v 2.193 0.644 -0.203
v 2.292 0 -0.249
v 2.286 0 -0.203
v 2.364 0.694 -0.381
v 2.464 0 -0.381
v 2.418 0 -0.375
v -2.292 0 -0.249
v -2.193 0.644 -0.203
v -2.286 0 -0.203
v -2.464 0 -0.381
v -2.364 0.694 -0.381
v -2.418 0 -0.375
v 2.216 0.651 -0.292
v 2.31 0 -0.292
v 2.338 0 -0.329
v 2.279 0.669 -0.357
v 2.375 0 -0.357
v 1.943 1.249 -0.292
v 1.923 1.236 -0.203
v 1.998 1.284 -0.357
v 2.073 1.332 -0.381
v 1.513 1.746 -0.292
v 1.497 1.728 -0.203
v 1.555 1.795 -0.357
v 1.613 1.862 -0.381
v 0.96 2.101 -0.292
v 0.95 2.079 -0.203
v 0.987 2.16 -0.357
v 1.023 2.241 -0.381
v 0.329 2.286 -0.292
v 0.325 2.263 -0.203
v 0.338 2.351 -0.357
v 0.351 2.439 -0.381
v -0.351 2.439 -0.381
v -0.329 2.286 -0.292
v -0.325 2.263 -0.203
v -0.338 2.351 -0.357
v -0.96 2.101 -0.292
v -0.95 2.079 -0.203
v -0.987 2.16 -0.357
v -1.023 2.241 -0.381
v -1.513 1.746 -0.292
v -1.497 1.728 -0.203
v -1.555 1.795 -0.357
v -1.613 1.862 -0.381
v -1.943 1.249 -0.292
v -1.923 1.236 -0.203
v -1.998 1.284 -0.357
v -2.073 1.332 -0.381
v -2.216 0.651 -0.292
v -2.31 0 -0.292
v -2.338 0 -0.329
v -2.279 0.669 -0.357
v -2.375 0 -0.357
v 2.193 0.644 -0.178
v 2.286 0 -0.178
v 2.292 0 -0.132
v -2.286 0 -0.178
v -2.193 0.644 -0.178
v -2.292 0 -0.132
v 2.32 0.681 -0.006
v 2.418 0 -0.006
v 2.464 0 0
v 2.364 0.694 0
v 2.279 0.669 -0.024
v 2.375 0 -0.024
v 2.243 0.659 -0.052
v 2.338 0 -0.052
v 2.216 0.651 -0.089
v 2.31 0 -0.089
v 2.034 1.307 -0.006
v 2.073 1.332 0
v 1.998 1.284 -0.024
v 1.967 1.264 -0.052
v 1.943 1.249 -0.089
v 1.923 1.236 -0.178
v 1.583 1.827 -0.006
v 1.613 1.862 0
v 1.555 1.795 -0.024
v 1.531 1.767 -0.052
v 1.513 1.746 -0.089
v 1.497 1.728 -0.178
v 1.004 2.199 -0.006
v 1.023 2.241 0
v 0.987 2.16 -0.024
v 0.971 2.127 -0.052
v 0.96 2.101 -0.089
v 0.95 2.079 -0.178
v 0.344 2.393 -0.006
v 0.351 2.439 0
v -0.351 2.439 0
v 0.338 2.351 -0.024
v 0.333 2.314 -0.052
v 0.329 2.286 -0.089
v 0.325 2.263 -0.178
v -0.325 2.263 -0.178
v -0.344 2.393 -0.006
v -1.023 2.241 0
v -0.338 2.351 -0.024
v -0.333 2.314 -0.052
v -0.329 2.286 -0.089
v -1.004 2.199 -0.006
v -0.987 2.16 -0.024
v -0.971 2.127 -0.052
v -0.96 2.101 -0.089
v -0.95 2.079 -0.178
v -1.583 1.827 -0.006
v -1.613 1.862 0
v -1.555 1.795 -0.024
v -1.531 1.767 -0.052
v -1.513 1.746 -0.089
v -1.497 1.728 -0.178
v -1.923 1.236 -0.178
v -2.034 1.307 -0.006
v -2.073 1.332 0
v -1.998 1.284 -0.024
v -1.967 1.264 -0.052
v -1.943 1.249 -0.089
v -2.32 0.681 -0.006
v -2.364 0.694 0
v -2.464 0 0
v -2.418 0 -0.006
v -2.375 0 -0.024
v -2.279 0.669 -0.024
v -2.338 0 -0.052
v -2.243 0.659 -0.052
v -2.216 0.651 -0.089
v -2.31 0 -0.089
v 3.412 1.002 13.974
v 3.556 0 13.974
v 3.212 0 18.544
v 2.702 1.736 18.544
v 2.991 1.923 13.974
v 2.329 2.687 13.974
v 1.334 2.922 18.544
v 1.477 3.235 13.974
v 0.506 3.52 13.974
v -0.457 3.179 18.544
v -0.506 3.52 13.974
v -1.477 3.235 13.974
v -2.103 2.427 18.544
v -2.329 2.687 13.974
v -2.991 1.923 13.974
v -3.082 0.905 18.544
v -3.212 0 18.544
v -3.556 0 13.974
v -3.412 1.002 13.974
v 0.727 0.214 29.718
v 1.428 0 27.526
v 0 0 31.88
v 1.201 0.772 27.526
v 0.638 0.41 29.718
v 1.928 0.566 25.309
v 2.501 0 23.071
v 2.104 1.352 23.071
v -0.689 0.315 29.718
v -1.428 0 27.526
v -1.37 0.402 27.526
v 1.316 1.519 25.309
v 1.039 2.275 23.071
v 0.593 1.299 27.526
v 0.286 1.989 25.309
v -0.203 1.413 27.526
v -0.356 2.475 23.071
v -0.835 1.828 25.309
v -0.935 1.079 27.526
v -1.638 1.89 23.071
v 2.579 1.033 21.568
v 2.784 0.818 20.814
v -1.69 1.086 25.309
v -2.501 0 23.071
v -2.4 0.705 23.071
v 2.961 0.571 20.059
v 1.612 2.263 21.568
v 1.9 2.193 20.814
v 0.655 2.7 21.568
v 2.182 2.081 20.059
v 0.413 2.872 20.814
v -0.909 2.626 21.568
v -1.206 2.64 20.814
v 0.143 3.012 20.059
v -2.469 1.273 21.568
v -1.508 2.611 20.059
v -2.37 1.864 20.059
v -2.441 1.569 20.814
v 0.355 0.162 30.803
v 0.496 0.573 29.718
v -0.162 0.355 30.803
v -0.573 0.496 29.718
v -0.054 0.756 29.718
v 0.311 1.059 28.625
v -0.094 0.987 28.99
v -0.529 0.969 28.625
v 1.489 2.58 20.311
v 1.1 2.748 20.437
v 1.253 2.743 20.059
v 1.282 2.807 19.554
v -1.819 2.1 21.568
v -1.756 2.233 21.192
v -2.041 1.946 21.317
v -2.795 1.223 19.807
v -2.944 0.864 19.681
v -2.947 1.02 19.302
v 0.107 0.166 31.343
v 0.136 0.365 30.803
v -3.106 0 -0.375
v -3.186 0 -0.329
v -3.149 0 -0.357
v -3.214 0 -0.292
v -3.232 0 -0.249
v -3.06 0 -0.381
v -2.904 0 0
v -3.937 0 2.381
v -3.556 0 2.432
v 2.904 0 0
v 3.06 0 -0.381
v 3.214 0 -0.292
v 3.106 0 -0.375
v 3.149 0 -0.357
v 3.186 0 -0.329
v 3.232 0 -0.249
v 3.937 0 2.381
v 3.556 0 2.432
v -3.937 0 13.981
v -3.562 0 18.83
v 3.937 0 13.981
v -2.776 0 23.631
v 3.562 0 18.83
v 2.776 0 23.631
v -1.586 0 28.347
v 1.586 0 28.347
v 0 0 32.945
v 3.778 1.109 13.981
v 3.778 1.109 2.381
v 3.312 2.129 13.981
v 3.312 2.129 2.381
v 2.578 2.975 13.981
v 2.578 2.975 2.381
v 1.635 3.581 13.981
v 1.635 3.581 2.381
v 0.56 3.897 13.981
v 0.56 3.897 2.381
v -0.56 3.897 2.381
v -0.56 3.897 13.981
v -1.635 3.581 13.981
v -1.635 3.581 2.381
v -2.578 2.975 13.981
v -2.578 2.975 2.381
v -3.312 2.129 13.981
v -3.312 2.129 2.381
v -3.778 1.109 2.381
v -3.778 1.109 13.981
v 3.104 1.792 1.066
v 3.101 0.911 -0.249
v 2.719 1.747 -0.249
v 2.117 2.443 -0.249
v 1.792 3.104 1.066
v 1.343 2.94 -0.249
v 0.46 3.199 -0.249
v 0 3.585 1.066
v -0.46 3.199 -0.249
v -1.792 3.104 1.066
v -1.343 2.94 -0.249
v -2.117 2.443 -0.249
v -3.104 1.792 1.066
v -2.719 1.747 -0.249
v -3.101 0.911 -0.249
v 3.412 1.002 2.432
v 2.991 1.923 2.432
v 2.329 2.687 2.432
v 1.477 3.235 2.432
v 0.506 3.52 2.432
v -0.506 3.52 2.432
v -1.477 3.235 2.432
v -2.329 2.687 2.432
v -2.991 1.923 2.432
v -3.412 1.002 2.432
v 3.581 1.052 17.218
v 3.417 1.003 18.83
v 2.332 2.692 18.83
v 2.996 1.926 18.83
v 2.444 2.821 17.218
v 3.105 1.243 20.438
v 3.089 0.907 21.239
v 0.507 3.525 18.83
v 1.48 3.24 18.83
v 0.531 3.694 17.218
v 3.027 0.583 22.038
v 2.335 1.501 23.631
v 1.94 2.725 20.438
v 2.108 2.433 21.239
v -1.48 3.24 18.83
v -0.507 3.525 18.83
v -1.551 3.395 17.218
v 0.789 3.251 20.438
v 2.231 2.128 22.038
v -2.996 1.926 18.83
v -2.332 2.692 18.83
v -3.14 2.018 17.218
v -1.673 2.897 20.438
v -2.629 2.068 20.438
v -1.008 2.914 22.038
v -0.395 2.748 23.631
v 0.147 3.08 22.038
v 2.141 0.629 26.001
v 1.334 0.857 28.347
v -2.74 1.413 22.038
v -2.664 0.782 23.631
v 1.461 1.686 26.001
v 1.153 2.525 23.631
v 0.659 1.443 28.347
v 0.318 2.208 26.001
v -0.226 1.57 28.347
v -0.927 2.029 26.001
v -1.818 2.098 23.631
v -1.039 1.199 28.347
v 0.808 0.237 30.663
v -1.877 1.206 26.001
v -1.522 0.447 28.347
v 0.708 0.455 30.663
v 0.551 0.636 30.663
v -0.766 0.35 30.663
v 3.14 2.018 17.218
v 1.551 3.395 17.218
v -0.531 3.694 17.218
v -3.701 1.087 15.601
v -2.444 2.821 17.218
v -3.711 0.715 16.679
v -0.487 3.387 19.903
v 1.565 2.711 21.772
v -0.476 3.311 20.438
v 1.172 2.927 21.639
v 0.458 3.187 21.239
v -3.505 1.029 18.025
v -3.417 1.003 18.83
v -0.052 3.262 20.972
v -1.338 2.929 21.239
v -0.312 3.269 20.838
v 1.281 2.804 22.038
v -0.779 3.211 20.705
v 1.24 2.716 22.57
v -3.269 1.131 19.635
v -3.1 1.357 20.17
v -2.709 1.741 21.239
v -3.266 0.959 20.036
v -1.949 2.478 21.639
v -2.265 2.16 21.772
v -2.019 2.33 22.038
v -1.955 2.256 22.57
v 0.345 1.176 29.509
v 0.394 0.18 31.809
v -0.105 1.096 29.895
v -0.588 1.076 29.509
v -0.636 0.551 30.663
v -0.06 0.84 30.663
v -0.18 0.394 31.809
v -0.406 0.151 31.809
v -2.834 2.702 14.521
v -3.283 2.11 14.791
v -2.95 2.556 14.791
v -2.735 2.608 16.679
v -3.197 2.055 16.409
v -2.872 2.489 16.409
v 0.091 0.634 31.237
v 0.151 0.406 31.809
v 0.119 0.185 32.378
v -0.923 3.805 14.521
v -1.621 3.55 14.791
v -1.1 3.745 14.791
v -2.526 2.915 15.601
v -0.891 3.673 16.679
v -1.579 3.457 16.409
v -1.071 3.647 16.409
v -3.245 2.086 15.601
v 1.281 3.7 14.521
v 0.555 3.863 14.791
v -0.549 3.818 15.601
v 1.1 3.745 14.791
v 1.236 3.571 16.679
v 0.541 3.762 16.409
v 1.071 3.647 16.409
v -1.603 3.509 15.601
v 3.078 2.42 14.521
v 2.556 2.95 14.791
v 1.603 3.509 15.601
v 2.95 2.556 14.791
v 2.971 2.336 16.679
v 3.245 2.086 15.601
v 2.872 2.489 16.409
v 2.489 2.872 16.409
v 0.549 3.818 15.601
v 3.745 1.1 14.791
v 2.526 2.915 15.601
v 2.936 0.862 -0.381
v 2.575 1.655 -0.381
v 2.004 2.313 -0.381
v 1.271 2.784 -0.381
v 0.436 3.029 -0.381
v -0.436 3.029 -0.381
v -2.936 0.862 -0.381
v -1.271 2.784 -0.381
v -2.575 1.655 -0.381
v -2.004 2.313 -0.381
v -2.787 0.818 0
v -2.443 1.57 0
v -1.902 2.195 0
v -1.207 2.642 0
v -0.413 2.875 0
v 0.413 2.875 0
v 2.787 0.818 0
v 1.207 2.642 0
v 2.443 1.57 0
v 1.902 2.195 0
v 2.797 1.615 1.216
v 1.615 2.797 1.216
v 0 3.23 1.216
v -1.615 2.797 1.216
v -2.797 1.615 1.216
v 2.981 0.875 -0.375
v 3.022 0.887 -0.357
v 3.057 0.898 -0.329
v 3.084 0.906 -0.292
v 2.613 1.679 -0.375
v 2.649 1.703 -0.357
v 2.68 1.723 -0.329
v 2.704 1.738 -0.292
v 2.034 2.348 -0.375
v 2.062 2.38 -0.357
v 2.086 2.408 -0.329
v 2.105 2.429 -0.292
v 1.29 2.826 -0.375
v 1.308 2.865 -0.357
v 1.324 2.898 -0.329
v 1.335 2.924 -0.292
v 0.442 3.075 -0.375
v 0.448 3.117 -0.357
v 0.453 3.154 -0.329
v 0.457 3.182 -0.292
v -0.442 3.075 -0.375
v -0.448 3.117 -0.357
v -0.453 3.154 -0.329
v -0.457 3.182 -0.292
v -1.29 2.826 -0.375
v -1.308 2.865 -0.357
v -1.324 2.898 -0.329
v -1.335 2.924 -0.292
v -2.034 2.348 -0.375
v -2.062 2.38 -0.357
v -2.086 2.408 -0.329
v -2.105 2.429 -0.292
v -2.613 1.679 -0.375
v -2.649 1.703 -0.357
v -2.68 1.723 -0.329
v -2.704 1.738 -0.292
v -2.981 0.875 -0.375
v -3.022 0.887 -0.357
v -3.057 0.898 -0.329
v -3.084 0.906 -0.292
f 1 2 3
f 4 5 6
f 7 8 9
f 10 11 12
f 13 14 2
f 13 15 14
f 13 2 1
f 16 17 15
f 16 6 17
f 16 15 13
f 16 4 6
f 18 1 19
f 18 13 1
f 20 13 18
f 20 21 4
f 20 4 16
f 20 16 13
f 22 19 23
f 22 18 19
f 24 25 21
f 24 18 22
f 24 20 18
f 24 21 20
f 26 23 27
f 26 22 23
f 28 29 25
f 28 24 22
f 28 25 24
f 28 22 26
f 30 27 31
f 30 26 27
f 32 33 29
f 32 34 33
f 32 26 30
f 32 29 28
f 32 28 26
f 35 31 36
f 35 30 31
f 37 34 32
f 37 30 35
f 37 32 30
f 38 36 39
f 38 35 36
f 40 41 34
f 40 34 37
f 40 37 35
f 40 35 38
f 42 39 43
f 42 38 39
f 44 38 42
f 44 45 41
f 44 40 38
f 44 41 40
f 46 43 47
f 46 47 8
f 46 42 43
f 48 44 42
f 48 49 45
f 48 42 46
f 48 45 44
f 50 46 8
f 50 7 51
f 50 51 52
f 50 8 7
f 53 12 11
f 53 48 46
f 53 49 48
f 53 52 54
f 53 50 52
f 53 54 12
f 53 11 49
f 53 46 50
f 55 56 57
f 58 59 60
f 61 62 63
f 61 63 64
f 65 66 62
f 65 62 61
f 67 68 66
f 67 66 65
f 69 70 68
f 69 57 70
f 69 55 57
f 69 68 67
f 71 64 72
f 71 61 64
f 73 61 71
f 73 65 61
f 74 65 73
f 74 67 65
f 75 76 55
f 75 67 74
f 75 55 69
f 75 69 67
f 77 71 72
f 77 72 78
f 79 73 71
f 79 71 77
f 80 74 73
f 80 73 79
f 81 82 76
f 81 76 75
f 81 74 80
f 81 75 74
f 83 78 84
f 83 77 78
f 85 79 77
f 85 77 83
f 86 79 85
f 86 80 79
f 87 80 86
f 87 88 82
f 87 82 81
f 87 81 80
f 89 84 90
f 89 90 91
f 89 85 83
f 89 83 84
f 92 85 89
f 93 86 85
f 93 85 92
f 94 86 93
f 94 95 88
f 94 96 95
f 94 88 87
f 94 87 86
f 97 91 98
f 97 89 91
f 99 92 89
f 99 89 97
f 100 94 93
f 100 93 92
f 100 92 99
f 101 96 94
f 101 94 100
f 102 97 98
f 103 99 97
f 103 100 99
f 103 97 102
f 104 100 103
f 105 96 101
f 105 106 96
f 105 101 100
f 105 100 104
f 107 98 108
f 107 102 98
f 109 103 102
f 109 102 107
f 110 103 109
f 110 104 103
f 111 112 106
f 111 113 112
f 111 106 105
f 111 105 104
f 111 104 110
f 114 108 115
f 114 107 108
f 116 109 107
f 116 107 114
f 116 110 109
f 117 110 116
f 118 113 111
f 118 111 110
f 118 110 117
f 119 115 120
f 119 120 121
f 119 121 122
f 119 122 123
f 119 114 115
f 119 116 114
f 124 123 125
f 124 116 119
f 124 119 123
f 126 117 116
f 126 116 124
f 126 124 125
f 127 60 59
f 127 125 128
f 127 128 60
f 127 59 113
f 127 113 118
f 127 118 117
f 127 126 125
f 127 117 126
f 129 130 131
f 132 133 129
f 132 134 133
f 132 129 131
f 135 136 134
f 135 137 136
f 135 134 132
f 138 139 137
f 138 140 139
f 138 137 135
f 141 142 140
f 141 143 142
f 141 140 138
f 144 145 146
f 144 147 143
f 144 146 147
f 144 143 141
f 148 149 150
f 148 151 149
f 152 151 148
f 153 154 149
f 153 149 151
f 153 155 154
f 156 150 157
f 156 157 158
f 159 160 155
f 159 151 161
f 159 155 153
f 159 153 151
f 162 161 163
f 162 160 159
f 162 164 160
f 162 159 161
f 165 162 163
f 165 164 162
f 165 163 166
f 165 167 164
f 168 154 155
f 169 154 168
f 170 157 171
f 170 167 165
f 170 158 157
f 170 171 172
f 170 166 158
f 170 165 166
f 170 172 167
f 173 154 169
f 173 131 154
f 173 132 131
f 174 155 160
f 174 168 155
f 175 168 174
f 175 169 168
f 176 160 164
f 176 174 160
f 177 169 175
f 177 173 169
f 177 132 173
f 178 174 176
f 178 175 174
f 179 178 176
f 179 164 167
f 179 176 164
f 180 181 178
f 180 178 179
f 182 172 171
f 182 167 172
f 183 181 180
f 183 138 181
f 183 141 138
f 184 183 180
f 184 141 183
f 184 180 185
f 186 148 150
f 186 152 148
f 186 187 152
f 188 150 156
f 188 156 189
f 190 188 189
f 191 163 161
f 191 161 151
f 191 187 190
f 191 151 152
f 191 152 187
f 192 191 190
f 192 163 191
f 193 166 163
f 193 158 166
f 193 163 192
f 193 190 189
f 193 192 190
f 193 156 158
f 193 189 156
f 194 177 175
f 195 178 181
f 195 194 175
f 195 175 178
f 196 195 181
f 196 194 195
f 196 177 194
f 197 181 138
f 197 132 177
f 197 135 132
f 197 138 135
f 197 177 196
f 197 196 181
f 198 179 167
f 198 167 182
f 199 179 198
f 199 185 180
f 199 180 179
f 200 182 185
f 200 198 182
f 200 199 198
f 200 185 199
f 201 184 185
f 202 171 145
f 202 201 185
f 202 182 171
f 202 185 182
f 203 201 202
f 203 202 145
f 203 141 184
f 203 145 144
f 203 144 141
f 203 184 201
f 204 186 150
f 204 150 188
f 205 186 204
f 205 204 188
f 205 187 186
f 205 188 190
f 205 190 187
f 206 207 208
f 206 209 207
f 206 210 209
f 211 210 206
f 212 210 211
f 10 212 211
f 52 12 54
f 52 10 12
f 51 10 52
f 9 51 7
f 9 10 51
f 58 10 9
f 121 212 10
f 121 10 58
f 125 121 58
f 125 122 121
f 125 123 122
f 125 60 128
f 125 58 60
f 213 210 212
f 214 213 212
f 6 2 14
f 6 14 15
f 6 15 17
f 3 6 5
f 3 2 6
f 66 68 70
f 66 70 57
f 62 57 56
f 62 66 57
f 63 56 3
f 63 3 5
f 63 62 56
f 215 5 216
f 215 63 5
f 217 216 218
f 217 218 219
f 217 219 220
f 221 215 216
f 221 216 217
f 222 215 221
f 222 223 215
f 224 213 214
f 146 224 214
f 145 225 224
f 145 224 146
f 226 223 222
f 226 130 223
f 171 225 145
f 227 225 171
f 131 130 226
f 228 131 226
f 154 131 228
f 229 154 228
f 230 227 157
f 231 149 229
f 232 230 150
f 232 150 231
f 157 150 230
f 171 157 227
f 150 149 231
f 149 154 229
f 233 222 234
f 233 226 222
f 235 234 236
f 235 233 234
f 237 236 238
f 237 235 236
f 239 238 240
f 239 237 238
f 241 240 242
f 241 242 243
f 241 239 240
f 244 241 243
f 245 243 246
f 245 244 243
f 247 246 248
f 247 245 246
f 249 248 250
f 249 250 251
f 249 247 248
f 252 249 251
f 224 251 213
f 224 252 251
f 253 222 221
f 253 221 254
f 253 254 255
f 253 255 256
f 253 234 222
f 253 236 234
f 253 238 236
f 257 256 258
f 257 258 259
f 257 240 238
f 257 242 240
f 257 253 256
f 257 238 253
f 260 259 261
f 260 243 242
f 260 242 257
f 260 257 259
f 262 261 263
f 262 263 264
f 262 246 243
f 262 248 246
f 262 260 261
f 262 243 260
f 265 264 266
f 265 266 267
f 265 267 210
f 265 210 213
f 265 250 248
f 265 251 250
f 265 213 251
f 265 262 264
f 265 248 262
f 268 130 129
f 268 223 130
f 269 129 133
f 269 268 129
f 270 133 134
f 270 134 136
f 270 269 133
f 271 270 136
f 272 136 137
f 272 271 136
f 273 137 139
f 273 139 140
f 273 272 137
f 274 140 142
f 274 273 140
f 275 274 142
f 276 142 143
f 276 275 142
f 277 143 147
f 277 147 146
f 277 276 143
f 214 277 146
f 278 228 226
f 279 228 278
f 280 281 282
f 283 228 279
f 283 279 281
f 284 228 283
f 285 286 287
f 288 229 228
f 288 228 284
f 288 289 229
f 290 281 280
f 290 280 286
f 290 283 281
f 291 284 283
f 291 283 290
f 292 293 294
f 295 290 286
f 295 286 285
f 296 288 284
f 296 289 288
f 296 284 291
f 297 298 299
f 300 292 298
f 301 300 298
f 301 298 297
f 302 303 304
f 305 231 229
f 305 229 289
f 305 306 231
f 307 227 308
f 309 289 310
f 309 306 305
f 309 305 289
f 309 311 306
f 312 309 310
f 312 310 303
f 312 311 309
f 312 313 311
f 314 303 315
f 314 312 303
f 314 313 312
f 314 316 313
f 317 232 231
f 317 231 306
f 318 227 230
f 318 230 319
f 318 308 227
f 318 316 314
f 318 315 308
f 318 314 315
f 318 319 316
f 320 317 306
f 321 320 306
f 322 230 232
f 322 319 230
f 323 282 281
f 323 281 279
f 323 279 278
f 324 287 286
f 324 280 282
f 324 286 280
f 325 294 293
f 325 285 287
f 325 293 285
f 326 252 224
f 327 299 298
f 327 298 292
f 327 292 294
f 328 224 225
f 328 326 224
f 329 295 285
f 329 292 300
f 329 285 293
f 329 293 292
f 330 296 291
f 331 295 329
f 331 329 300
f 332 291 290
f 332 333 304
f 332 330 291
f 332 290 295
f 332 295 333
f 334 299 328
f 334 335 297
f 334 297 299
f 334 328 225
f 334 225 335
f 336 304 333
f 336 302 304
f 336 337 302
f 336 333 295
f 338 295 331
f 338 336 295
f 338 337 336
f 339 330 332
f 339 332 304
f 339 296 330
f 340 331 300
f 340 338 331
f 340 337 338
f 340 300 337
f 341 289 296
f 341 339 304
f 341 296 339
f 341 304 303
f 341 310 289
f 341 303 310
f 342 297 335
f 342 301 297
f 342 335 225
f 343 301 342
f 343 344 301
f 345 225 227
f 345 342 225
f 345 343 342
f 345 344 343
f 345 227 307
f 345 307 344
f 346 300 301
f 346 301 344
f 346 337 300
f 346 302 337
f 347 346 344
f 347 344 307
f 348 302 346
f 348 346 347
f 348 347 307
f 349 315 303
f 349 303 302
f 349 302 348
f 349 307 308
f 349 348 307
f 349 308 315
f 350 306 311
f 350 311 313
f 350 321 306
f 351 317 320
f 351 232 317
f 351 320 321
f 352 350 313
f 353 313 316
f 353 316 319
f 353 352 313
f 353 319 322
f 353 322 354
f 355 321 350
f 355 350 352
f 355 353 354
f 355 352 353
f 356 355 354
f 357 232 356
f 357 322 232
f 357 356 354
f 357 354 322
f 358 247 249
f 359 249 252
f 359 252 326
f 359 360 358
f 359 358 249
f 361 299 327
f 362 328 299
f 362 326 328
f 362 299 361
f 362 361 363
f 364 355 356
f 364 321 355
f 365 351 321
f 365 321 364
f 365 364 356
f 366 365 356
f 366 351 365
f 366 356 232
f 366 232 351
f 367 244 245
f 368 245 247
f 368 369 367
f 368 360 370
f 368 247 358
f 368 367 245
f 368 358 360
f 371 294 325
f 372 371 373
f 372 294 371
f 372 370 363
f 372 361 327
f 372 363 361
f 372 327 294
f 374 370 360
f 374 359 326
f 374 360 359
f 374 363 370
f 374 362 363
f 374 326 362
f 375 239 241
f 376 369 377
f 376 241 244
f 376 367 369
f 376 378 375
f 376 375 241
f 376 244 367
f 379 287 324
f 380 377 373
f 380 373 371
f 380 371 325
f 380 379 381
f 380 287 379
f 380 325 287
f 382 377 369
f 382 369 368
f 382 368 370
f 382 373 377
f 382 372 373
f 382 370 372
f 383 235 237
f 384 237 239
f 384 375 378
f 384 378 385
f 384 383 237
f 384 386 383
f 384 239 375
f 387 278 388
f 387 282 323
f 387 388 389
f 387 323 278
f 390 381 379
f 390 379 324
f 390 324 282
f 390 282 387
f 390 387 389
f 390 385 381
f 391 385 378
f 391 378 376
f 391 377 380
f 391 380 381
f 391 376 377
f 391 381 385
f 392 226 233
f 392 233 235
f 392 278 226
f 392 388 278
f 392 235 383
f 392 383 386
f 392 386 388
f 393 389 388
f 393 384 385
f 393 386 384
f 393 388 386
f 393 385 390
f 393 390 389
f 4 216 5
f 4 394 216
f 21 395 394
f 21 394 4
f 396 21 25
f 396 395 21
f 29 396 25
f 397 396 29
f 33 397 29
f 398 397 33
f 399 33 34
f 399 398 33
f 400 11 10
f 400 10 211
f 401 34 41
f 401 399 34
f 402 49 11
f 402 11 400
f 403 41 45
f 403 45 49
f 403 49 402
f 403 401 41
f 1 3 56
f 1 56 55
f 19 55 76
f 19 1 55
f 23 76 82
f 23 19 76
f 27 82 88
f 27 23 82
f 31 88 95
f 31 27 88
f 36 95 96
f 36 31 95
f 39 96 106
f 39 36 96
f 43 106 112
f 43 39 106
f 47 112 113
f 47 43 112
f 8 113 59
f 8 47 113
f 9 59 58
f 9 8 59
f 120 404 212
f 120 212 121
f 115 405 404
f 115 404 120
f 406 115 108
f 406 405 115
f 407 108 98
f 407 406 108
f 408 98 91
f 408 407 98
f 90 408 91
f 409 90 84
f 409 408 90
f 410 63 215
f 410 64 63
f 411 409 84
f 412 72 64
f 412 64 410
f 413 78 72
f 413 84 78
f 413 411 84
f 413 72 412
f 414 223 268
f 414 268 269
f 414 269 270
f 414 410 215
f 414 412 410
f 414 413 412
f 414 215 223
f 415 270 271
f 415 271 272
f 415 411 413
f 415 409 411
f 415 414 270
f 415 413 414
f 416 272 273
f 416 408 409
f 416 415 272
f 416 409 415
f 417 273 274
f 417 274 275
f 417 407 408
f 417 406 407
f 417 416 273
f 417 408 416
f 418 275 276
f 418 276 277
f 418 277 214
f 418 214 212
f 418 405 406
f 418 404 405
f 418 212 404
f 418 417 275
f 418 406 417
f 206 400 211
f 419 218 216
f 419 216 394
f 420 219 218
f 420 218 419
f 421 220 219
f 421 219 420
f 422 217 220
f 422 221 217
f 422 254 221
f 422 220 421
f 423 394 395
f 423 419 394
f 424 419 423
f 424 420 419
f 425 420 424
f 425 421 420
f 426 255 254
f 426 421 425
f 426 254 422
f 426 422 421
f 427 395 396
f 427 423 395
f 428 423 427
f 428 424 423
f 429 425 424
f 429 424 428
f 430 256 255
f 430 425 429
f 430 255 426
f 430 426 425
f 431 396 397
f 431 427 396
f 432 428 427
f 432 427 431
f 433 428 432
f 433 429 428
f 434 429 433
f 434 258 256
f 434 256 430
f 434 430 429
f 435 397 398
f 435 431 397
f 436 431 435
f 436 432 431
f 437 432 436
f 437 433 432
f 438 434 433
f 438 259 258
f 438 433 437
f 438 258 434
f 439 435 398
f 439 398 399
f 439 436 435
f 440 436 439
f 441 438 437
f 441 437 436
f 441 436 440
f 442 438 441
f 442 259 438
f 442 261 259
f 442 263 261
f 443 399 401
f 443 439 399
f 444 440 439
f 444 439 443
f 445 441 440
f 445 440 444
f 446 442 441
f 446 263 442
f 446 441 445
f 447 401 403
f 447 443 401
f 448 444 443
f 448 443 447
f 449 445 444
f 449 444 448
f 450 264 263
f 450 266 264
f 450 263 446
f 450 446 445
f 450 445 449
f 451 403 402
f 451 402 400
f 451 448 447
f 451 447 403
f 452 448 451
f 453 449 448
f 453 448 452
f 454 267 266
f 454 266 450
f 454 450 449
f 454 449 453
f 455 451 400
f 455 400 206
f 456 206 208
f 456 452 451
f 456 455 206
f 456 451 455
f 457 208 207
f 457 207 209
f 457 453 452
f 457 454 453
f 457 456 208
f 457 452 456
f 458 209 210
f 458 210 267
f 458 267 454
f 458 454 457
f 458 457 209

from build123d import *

# Parameters (mm, degrees)
F1_ANGLE = 180
F2_R     = 0.1778


with BuildPart() as f1:
    # F0 (on Front) → F1 (revolve)
    with BuildSketch(Plane.XZ):
        with BuildLine():
            Line((3.556, 13.974021), (3.556, 2.431545))
            Line((3.556, 2.431545), (2.904469, 0))
            Line((2.904469, 0), (2.286, 0))
            Line((2.286, 0), (2.286, -0.381))
            Line((2.286, -0.381), (3.196821, -0.381))
            Line((3.196821, -0.381), (3.937, 2.381385))
            Line((3.937, 2.381385), (3.937, 13.980661))
            ThreePointArc((3.937, 13.980661), (2.775962, 23.630641), (0, 32.945369))
            Line((0, 32.945369), (0, 31.880476))
            ThreePointArc((0, 31.880476), (2.500884, 23.070804), (3.556, 13.974021))
        make_face()
    revolve(axis=Axis((0, 0, 32.412922), (0, 0, 1)), revolution_arc=F1_ANGLE)

    # F2
    f2_edges = [f1.edges().sort_by_distance(p)[0] for p in [
        (0, 2.286, 0),
        (0, 2.286, -0.381),
        (0, 3.196821, -0.381),
    ]]
    fillet(f2_edges, radius=F2_R)


solid = f1.part
